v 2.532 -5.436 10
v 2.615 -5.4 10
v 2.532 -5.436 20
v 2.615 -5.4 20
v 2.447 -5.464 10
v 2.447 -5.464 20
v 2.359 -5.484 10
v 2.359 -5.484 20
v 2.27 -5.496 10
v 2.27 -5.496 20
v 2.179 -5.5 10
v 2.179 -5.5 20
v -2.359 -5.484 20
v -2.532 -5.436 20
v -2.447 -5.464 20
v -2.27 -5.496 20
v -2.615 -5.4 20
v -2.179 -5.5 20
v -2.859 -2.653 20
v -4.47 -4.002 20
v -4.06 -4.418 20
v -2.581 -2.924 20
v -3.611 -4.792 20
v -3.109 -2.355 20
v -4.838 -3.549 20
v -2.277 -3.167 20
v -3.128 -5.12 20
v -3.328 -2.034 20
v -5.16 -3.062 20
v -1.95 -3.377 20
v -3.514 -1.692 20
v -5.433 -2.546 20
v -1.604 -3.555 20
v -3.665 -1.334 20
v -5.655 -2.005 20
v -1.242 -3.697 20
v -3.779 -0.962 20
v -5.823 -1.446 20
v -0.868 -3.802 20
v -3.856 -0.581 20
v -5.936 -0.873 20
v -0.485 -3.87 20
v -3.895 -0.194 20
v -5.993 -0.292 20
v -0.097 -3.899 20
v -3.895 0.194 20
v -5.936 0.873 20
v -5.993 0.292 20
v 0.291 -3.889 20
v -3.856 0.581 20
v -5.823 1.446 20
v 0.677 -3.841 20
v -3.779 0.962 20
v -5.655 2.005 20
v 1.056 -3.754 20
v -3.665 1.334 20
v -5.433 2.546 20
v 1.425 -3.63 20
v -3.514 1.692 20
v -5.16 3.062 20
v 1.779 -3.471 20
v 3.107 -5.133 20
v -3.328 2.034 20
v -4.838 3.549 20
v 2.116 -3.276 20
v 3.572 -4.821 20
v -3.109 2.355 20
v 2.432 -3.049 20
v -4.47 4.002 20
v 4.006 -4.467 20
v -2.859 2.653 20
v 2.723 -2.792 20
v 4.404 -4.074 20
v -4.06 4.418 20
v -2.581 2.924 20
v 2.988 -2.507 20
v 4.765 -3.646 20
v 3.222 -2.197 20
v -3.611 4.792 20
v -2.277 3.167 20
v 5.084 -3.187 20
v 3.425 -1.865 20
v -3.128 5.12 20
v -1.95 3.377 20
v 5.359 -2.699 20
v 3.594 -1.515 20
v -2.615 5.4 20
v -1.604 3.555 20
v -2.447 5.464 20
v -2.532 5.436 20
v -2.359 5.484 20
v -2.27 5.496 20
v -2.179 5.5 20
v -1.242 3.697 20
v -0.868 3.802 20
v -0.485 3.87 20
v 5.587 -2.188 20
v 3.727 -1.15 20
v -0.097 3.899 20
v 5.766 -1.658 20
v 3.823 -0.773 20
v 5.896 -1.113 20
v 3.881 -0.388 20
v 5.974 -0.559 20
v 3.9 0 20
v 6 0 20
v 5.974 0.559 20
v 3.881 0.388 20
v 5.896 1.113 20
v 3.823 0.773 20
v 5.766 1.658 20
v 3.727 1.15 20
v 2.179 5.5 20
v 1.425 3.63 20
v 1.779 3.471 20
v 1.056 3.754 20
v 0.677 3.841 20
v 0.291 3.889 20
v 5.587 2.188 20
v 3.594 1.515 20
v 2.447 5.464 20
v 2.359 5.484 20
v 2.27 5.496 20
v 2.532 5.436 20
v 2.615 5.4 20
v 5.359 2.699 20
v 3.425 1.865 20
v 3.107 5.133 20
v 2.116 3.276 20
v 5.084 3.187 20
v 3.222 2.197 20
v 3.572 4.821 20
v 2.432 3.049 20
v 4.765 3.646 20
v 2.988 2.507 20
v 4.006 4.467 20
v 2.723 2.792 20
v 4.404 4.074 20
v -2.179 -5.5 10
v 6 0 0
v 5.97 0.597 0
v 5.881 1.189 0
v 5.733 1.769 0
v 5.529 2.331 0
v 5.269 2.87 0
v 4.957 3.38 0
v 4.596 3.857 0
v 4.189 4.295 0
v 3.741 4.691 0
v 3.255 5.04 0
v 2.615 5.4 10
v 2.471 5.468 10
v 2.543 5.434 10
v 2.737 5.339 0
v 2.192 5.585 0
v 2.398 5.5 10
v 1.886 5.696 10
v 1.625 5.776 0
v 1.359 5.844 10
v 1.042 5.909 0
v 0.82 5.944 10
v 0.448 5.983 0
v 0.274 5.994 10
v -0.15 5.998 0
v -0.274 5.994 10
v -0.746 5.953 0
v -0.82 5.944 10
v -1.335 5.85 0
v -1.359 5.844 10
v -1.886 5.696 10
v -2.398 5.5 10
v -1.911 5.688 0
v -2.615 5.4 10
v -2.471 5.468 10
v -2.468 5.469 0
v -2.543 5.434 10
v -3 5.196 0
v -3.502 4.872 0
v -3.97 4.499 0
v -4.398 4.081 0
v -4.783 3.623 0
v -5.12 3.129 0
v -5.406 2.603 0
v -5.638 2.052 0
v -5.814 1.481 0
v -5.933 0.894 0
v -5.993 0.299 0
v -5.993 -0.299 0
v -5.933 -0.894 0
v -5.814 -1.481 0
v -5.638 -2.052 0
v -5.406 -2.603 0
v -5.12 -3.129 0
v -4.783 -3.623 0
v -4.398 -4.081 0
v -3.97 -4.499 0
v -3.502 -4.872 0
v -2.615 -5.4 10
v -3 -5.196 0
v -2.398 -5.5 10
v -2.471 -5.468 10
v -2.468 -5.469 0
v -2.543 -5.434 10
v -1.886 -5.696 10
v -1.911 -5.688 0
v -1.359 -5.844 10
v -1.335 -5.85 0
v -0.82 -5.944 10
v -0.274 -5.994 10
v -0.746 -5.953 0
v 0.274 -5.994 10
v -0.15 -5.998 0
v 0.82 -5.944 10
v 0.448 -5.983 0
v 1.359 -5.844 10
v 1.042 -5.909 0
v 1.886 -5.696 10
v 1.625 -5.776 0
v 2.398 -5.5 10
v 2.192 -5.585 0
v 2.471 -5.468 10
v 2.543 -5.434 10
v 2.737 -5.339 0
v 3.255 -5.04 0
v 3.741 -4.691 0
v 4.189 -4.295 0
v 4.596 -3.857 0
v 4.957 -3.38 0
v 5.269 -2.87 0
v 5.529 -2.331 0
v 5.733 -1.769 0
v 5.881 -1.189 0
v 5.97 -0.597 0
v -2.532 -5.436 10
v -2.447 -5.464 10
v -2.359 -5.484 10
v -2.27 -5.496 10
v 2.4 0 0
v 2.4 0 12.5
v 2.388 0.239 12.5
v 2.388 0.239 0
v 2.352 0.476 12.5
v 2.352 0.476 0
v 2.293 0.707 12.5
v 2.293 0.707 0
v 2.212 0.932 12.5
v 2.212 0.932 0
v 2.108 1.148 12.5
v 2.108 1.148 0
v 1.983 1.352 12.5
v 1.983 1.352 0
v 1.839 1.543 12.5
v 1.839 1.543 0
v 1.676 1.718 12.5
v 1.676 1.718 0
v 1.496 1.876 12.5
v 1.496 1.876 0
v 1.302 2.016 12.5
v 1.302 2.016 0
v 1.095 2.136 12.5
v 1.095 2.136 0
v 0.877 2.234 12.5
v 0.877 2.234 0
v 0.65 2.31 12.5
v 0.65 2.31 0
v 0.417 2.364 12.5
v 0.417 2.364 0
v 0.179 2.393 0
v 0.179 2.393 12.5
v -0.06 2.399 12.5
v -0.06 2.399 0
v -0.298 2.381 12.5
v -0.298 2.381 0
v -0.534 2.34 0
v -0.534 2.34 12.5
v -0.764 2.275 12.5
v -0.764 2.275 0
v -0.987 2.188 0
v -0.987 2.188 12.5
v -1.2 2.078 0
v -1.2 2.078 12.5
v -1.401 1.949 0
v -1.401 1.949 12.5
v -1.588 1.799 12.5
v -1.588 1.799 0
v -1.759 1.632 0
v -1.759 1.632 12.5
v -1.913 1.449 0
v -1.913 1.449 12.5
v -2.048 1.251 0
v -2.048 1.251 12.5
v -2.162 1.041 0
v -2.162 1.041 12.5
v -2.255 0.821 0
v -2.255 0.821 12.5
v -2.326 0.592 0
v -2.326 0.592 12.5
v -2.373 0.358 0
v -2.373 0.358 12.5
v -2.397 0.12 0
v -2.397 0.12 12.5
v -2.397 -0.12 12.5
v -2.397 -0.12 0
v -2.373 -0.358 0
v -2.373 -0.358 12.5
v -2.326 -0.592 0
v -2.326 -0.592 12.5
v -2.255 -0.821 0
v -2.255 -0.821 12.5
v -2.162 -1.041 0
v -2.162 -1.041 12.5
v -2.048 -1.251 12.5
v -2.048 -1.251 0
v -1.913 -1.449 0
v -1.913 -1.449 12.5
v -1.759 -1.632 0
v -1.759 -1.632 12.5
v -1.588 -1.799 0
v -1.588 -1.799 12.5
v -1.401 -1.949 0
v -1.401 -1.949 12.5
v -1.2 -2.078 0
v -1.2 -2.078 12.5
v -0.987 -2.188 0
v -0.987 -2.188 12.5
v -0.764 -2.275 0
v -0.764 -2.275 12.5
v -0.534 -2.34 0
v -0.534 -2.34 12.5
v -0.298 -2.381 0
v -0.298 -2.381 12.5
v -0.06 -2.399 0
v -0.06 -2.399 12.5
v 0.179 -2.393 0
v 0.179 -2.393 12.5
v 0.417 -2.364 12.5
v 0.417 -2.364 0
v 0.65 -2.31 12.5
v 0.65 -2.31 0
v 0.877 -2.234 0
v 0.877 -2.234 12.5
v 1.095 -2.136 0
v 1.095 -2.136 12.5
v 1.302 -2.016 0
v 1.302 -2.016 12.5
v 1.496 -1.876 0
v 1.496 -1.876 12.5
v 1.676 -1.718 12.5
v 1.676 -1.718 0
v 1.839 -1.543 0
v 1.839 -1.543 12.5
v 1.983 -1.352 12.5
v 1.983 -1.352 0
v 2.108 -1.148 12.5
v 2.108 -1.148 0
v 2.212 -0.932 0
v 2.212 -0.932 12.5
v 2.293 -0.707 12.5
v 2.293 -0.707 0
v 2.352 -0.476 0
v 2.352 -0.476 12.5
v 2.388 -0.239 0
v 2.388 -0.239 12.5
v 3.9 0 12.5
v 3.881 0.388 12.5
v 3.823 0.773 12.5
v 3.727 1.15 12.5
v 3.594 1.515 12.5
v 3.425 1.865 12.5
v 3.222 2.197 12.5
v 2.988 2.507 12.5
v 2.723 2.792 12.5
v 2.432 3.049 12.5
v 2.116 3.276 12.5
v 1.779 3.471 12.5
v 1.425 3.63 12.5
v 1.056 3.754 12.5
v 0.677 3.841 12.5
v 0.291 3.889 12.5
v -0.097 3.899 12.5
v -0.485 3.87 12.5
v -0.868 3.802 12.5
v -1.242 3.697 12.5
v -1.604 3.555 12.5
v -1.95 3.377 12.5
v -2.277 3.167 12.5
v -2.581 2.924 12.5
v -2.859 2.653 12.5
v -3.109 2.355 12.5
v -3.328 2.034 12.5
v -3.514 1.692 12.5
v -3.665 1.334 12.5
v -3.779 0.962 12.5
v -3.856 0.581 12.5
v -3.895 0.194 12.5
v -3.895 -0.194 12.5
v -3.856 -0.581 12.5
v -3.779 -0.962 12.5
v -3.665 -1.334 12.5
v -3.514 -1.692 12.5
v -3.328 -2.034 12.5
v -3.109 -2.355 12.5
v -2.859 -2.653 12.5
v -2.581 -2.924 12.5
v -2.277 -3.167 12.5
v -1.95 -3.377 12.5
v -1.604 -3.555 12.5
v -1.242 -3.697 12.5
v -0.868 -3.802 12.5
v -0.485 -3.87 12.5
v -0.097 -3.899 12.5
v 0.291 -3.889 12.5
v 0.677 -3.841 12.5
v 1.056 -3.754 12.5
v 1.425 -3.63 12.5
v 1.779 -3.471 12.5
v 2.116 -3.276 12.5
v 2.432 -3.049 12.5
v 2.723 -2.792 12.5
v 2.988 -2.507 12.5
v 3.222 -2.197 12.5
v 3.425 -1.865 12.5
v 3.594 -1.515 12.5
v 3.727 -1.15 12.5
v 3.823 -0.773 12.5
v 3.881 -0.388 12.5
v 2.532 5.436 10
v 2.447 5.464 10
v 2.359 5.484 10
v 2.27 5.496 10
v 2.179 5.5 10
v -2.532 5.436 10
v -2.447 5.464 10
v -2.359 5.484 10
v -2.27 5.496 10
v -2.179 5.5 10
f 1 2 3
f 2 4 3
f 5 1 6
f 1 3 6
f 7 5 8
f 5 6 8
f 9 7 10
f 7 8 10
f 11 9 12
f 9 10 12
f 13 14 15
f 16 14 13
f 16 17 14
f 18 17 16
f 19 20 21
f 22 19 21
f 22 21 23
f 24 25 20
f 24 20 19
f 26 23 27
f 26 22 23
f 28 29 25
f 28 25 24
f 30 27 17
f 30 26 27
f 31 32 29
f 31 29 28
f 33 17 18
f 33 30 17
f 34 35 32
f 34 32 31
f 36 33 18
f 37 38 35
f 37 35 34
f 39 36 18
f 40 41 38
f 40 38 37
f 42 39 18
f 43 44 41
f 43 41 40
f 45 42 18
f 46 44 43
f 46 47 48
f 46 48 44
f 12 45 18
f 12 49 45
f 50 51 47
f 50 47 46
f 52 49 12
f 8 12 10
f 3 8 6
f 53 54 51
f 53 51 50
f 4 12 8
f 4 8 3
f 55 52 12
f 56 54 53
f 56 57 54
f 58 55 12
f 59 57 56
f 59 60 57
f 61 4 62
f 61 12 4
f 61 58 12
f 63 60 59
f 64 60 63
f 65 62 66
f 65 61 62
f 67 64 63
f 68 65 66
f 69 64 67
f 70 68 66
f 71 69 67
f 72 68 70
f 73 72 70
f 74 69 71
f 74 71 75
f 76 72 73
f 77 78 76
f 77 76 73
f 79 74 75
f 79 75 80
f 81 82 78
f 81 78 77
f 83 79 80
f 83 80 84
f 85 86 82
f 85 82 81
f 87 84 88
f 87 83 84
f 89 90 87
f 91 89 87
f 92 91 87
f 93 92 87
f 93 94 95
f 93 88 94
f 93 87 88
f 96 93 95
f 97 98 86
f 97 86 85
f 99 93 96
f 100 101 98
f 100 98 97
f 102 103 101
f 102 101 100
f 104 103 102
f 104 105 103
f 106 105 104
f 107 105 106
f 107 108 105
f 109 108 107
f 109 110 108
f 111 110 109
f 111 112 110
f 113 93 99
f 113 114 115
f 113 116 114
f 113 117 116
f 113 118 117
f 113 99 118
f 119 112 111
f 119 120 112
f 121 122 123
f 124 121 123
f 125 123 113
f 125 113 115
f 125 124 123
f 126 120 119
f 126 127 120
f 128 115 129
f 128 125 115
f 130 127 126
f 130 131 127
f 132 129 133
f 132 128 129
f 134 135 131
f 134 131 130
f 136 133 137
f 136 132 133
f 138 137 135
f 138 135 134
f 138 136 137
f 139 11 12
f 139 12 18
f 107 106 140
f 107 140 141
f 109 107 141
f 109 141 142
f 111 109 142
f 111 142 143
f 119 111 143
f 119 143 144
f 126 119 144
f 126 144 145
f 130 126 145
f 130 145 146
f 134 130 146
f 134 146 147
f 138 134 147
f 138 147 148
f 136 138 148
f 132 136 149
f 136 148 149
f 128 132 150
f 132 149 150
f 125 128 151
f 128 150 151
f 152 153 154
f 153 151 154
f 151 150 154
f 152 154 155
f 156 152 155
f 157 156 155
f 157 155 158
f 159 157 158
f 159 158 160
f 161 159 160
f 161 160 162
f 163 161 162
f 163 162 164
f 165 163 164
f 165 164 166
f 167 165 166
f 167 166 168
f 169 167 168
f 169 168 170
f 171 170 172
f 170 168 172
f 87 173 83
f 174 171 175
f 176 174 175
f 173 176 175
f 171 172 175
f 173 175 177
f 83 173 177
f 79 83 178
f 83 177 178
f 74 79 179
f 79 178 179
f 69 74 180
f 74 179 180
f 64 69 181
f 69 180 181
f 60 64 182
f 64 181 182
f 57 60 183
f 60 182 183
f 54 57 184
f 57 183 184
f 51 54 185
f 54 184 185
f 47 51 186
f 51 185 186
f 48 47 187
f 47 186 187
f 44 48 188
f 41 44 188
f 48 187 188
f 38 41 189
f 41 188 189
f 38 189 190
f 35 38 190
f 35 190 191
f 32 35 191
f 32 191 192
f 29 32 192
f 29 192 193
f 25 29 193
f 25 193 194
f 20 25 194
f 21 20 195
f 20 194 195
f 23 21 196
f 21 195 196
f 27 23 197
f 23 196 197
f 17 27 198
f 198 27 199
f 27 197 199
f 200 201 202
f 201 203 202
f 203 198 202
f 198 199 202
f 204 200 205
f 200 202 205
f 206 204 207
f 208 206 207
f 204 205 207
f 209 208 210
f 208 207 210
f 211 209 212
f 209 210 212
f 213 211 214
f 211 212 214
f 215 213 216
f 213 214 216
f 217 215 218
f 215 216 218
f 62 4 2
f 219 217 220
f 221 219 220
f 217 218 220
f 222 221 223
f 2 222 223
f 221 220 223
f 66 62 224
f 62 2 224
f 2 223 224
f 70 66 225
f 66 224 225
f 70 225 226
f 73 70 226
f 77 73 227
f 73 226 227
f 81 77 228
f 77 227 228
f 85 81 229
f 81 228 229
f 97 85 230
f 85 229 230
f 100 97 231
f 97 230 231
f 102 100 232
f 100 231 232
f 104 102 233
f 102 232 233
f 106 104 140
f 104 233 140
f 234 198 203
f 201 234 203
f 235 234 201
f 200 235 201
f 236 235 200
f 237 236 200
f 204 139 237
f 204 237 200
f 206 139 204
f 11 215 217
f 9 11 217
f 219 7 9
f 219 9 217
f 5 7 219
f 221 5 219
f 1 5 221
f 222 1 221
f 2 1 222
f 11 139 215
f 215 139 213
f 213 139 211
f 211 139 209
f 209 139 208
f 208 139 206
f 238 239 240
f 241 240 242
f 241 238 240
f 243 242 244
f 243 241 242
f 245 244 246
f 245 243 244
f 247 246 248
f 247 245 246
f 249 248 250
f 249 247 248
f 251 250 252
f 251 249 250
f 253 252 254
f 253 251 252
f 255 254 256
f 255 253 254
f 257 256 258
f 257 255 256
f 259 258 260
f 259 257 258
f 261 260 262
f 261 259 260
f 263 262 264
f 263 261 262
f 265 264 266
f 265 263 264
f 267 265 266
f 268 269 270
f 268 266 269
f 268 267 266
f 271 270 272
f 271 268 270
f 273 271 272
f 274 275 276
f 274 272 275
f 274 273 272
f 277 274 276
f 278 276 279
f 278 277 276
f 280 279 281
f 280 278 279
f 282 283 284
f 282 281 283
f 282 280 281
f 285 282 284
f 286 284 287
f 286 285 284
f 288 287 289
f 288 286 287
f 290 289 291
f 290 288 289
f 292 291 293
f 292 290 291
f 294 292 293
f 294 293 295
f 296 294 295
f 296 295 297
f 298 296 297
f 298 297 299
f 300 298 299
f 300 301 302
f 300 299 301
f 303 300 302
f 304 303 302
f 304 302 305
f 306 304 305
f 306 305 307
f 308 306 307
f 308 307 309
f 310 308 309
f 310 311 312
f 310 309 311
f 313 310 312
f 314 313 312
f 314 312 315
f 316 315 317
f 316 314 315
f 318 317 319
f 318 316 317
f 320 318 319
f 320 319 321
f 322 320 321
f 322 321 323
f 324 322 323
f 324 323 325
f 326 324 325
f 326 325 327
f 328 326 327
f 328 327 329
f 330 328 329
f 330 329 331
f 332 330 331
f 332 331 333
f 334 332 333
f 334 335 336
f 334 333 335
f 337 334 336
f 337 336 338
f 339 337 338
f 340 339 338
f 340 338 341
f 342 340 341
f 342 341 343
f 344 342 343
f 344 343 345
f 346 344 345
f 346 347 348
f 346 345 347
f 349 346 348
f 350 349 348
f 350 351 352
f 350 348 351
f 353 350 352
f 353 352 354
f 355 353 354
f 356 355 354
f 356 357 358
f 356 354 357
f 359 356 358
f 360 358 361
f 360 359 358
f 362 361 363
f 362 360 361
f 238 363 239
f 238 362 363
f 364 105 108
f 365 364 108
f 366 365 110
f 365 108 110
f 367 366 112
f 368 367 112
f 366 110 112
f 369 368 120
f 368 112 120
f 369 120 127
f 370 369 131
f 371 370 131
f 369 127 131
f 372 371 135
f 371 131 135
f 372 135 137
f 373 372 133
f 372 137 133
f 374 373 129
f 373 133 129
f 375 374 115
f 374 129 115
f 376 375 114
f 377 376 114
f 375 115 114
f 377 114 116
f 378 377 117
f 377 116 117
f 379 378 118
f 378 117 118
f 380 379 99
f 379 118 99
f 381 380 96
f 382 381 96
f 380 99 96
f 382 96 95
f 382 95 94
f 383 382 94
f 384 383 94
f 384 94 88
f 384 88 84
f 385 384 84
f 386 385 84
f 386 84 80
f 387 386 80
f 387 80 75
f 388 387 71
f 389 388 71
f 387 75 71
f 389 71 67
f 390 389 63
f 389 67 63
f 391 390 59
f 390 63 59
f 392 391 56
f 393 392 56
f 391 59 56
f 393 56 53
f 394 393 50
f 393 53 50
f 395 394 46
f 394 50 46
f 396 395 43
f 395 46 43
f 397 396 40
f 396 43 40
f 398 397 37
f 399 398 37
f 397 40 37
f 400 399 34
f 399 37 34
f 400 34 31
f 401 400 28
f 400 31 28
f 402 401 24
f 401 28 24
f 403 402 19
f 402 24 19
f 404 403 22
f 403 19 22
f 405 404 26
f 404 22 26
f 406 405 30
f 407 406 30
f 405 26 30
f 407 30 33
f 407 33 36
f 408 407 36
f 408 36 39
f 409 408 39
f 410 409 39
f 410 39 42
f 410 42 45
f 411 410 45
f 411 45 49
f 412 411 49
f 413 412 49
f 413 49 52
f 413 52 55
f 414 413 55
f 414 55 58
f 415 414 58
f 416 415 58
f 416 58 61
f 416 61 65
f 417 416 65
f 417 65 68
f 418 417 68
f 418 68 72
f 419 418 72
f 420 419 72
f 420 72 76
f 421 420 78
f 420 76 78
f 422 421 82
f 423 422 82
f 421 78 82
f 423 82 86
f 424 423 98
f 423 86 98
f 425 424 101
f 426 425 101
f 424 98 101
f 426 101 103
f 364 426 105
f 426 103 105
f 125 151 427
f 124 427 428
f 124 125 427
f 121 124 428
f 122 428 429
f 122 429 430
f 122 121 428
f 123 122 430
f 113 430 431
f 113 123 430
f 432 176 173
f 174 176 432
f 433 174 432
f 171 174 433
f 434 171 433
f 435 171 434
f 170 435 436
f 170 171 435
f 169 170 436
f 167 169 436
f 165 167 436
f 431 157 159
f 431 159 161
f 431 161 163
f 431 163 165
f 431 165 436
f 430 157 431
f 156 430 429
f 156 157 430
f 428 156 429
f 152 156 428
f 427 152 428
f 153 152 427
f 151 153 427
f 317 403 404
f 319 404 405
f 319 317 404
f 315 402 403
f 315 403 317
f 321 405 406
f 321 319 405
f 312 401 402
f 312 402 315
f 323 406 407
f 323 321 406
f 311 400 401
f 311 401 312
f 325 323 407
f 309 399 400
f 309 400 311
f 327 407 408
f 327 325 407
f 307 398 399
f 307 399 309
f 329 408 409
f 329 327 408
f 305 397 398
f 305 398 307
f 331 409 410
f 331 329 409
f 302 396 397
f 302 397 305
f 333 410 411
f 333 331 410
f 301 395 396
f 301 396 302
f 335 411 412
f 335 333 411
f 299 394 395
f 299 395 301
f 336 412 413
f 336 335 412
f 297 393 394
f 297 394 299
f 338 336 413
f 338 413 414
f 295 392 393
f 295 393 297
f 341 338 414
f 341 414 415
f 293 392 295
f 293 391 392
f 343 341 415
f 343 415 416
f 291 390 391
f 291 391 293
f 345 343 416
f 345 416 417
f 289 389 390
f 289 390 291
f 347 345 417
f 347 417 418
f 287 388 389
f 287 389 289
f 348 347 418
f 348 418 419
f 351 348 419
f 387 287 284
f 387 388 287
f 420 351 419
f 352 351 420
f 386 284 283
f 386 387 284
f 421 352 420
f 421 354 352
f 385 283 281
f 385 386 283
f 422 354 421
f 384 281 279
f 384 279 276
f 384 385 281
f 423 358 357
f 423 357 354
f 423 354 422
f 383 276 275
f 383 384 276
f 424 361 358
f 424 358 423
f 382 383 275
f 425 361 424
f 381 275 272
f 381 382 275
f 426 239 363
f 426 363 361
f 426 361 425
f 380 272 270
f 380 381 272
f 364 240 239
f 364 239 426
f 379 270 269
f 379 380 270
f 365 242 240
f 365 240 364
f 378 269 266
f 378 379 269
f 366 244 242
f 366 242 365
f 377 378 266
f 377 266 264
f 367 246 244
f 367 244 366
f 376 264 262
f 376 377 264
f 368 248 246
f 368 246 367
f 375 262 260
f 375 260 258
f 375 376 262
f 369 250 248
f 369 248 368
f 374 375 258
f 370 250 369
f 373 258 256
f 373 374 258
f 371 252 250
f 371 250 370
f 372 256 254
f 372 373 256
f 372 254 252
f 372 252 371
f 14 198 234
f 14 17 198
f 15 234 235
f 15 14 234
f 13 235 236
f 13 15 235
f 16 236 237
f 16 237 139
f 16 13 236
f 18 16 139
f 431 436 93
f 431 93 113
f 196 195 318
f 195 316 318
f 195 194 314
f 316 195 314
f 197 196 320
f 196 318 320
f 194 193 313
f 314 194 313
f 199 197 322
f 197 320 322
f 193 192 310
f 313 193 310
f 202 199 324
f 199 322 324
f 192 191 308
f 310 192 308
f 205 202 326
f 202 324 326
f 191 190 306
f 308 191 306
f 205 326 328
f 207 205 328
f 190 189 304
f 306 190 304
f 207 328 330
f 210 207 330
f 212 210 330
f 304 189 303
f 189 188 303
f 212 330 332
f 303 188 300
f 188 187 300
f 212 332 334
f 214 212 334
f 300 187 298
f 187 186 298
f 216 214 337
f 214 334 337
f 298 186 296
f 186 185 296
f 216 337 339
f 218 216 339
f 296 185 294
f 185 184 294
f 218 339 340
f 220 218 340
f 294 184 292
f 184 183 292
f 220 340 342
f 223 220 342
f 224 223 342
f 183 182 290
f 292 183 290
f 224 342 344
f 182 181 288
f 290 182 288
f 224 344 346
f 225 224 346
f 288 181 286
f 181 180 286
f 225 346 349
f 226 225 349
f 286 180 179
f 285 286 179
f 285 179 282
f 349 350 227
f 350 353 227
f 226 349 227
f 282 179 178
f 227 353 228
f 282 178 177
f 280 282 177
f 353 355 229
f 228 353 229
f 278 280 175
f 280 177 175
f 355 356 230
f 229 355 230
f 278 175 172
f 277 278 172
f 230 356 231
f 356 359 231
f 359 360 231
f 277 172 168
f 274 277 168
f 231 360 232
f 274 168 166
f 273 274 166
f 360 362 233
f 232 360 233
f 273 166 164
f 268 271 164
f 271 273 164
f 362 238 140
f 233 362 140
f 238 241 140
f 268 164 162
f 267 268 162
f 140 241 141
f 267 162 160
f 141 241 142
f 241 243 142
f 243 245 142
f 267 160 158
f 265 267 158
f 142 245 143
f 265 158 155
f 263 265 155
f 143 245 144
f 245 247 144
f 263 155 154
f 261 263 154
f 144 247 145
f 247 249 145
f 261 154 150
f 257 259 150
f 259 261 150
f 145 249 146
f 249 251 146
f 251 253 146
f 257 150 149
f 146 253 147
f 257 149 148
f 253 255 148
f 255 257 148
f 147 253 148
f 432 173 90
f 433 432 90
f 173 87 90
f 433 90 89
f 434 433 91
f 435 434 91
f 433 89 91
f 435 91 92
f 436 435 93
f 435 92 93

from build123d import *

# Parameters (mm, degrees)
SKETCH1_R           = 6
SKETCH1_R_2         = 2.4
BOSS_EXTRUDE1_DEPTH = 20
SKETCH2_R           = 3.9
CUT_EXTRUDE1_DEPTH  = 7.5
CUT_EXTRUDE2_START  = -10
CUT_EXTRUDE2_DEPTH  = 10
FILLET1_R           = 1


with BuildPart() as part:
    # Sketch1 → Boss-Extrude1 (new body)
    with BuildSketch(Plane.XY):
        Circle(SKETCH1_R)
        Circle(SKETCH1_R_2, mode=Mode.SUBTRACT)
    extrude(amount=BOSS_EXTRUDE1_DEPTH)

    # Sketch2 → Cut-Extrude1 (cut)
    with BuildSketch(Plane.XY.offset(20)):
        Circle(SKETCH2_R)
    extrude(amount=-CUT_EXTRUDE1_DEPTH, mode=Mode.SUBTRACT)

    # Sketch4 → Cut-Extrude2 (cut)
    with BuildSketch(Plane.XY.offset(20).offset(CUT_EXTRUDE2_START)):
        with BuildLine():
            Line((-2.397915762, 5.5), (2.397915762, 5.5))
            ThreePointArc((2.397915762, 5.5), (0, 6), (-2.397915762, 5.5))
        make_face()
        with BuildLine():
            Line((2.397915762, -5.5), (-2.397915762, -5.5))
            ThreePointArc((-2.397915762, -5.5), (0, -6), (2.397915762, -5.5))
        make_face()
    extrude(amount=CUT_EXTRUDE2_DEPTH, mode=Mode.SUBTRACT)

    # Fillet1
    fillet1_edges = [part.edges().sort_by_distance(p)[0] for p in [
        (-2.397915762, 5.5, 15),
        (2.397915762, 5.5, 15),
        (2.397915762, -5.5, 15),
        (-2.397915762, -5.5, 15),
    ]]
    fillet(fillet1_edges, radius=FILLET1_R)


solid = part.part
